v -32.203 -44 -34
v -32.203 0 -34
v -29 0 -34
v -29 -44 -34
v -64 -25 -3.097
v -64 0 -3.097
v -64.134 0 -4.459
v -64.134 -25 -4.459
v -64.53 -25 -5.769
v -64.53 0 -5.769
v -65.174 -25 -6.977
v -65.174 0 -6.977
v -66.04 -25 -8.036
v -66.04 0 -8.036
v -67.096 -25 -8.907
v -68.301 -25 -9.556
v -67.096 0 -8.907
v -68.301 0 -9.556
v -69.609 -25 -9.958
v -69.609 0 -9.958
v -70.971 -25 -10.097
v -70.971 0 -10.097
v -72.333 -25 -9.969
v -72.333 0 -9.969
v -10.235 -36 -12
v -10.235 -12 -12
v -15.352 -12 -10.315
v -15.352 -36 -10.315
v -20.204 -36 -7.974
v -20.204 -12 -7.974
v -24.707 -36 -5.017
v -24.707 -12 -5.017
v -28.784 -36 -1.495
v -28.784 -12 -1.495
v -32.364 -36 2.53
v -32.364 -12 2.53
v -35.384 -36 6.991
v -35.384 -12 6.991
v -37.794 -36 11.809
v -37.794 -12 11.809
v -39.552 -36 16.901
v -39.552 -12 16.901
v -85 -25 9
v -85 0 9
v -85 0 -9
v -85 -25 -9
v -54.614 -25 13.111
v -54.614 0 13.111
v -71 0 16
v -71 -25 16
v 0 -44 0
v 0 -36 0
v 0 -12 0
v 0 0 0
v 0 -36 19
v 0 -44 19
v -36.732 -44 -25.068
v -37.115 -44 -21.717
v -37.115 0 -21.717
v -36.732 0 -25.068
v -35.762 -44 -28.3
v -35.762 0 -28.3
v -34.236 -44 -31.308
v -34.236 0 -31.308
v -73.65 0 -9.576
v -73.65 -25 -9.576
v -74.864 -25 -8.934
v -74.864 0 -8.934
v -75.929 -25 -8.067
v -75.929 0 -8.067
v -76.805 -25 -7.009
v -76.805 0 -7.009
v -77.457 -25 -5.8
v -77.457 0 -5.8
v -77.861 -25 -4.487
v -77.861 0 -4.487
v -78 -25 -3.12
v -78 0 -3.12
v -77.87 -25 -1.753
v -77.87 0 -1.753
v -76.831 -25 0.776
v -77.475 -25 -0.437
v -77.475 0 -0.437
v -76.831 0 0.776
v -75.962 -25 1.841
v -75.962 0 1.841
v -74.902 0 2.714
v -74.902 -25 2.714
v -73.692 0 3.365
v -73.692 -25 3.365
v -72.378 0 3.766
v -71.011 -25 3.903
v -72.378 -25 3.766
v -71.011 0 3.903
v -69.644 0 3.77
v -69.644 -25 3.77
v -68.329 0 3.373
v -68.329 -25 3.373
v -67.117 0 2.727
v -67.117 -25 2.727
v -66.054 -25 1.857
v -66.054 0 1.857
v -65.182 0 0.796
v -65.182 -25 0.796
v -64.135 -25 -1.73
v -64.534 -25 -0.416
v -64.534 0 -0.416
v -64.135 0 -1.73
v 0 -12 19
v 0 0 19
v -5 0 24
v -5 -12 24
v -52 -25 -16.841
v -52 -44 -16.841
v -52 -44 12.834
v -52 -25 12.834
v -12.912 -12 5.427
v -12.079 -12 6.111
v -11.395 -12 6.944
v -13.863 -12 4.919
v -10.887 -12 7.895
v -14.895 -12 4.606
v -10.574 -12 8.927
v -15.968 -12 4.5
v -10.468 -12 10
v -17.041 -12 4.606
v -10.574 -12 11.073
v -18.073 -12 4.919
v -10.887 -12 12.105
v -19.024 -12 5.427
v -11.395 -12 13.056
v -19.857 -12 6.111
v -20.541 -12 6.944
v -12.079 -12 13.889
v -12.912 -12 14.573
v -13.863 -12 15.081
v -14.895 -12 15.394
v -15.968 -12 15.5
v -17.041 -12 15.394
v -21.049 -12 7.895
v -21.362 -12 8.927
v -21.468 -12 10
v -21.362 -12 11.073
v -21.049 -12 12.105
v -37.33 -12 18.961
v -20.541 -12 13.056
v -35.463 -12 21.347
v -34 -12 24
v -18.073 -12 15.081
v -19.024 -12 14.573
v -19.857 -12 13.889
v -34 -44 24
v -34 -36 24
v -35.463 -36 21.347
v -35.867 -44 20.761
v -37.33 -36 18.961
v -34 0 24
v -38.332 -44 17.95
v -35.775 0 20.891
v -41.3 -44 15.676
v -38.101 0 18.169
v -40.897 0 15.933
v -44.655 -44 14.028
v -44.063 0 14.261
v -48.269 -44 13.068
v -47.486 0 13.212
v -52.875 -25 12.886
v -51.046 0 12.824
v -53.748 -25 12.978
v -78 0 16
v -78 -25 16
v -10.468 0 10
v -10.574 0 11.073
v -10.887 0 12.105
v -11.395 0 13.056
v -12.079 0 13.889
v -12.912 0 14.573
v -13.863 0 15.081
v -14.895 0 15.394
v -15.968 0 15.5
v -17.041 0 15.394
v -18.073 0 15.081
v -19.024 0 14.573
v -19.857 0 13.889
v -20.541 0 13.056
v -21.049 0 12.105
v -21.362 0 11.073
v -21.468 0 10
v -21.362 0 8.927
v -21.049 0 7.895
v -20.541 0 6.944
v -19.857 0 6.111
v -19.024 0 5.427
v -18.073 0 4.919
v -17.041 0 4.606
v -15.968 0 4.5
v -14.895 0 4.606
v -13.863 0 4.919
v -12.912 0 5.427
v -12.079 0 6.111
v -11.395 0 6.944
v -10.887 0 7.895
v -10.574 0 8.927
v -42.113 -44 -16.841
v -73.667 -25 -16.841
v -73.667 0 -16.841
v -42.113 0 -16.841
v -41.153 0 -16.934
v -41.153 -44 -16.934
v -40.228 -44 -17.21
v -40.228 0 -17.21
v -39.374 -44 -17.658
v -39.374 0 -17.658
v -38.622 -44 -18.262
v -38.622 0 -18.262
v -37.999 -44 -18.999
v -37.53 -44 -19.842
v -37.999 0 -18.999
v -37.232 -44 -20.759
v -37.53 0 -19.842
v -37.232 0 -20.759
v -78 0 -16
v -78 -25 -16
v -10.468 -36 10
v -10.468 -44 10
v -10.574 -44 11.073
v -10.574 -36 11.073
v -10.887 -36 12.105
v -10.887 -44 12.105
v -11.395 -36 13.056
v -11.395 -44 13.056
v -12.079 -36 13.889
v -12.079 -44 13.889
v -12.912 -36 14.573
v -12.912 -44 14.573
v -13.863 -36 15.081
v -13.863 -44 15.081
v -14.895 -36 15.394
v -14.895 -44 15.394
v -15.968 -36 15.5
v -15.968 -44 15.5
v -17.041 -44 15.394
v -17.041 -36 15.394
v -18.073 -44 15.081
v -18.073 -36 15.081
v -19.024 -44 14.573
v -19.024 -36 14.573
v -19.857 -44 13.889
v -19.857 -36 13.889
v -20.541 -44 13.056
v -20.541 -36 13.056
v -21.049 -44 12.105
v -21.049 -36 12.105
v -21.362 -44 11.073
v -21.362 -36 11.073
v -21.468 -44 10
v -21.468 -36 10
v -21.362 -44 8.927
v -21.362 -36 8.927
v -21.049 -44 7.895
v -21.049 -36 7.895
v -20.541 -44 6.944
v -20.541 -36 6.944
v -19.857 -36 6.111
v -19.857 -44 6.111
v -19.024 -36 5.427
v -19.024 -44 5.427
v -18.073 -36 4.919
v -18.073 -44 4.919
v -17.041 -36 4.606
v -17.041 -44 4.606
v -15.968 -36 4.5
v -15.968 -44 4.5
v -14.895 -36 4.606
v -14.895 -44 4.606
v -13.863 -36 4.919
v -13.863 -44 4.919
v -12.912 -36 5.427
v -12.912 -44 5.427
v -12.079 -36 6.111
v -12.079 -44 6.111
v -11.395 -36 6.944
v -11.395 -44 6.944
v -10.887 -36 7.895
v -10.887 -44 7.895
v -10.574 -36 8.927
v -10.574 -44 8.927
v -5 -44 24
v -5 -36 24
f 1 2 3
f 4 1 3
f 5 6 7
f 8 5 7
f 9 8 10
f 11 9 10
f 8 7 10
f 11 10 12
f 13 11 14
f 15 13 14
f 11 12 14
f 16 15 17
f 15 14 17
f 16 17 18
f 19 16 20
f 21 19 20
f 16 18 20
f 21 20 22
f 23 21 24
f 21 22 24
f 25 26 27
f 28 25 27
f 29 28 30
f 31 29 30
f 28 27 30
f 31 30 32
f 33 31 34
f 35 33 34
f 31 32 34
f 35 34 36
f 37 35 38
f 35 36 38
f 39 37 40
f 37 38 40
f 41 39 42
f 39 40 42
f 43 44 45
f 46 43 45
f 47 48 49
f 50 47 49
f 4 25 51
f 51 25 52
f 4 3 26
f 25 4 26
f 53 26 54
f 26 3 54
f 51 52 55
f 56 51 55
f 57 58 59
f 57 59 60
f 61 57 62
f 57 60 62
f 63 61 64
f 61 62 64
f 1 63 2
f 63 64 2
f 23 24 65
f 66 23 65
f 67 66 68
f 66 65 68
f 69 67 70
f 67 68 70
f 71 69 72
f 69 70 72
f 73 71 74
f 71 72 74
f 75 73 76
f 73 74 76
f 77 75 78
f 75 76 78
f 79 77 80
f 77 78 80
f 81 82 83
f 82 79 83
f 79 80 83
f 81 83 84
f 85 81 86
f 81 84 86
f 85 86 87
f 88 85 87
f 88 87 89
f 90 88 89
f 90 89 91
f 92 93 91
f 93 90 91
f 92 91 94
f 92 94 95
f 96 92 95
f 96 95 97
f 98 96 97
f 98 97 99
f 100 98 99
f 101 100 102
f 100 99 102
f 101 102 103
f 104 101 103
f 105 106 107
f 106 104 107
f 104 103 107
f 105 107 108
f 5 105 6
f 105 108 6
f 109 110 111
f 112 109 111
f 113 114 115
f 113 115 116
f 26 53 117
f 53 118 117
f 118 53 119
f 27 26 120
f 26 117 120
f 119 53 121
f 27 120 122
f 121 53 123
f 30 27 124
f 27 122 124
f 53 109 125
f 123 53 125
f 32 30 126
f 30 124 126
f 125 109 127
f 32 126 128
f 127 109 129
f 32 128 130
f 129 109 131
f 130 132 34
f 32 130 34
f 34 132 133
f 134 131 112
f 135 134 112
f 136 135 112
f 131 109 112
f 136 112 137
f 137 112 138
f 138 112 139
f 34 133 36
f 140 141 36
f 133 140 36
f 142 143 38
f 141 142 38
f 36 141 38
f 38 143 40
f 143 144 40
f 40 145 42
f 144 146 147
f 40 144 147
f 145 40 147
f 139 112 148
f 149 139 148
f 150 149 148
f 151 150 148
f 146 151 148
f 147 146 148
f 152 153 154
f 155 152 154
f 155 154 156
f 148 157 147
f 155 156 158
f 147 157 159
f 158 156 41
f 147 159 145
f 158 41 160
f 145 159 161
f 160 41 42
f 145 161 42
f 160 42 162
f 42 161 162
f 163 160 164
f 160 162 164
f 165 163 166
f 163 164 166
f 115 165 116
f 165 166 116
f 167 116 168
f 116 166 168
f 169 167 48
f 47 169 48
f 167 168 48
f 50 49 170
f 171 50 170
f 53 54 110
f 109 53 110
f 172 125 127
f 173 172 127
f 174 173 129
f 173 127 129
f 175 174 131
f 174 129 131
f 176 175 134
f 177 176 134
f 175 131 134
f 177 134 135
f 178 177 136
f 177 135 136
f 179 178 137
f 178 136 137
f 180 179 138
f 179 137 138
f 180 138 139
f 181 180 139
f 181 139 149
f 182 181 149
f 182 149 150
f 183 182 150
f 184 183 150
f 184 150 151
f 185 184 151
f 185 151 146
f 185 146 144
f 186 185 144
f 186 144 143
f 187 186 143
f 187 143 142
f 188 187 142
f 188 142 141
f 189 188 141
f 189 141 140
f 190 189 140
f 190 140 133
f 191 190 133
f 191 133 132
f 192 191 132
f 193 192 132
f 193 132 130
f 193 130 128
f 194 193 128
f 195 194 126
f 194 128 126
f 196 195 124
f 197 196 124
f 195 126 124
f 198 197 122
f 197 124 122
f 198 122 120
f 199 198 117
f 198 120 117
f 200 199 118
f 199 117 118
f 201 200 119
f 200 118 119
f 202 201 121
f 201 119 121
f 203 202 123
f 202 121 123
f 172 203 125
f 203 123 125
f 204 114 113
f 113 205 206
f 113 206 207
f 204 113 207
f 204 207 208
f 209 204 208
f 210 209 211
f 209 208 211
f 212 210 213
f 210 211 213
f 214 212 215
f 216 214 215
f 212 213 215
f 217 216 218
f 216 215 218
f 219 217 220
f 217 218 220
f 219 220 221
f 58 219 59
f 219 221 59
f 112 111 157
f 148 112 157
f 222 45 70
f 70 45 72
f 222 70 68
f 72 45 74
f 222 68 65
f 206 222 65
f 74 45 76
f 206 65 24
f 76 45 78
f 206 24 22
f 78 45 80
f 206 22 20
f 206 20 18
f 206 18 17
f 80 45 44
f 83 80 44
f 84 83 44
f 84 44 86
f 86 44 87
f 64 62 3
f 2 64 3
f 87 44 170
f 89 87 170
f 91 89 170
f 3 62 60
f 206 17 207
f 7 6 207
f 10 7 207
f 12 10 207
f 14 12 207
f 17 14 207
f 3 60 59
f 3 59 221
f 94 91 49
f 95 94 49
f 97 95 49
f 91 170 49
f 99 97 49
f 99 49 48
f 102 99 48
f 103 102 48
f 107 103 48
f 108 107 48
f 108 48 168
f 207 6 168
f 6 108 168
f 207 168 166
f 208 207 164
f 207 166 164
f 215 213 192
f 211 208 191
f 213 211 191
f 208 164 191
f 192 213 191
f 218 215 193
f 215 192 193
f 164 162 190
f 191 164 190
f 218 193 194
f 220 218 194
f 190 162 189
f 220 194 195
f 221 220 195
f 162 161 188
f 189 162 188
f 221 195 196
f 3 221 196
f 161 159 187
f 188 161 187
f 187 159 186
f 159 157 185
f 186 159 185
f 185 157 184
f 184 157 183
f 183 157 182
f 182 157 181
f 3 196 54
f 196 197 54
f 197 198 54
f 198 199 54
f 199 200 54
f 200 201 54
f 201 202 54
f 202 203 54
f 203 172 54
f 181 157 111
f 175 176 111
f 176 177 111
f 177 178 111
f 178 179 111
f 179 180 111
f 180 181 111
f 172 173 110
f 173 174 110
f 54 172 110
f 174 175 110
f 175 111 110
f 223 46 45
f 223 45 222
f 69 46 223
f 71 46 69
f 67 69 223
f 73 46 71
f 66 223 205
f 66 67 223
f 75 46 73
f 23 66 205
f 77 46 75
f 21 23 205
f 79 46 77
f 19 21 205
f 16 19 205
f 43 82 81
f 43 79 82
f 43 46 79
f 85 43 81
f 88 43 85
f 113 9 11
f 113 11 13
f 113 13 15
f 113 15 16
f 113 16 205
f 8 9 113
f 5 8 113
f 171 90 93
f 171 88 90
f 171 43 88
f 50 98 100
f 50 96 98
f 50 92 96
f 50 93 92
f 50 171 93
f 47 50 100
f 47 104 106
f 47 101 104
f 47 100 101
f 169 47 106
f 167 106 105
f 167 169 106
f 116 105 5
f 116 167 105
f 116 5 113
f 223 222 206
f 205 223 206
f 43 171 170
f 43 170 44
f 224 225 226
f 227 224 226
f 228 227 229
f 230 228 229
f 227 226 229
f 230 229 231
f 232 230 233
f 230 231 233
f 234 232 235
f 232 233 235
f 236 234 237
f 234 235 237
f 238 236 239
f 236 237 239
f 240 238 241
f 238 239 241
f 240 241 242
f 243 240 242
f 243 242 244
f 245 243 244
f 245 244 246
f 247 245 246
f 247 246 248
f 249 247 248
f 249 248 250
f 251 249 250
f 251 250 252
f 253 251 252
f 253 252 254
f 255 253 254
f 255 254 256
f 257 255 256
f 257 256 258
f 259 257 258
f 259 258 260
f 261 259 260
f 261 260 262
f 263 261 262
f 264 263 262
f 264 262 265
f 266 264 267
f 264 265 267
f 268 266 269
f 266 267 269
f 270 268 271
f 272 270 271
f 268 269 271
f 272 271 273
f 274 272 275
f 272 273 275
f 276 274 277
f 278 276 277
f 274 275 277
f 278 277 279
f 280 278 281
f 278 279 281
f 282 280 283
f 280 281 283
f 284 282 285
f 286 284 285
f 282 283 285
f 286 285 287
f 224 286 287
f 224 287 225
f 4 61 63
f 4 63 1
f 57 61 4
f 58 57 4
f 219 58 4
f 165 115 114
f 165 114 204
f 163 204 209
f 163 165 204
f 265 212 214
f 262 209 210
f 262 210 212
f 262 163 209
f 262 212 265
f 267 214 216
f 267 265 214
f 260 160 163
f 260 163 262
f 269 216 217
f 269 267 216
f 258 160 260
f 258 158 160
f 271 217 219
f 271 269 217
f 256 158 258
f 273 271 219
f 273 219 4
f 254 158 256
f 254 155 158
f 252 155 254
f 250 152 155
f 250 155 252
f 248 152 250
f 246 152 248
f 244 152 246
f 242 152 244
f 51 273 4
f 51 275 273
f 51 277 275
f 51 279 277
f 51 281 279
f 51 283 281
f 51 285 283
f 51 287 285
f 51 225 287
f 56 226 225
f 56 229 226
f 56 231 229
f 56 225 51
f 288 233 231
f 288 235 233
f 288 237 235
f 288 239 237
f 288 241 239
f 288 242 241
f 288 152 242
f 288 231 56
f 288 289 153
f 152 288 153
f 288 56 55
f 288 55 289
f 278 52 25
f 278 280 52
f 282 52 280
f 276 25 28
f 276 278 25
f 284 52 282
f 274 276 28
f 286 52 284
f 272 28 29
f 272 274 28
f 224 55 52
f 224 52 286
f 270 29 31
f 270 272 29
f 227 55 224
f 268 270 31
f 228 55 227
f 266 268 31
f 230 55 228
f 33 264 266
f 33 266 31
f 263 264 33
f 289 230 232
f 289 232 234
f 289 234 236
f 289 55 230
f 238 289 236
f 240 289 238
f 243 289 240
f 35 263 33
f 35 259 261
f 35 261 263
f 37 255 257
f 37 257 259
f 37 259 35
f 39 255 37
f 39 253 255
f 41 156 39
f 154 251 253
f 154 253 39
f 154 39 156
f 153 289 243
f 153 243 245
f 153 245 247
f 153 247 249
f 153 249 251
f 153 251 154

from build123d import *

# Parameters (mm, degrees)
F1_DEPTH      = 44
F2_R          = 5.5
F3_DEPTH      = 44.001
F4_W          = 33
F4_H          = 19
F5_DEPTH      = 24.001
F5_DEPTH_BACK = 25
F8_DEPTH      = 24


with BuildPart() as f1:
    # F0 (on Front) → F1 (new body)
    with BuildSketch(Plane.XZ):
        with BuildLine():
            Line((-29, -34), (0, 0))
            Line((0, 0), (0, 19))
            Line((0, 19), (-5, 24))
            Line((-5, 24), (-34, 24))
            ThreePointArc((-34, 24), (-42.4407650408, 15.0219737764), (-54.6144594201, 13.1107871023))
            Line((-54.6144594201, 13.1107871023), (-71, 16))
            Line((-71, 16), (-78, 16))
            Line((-78, 16), (-85, 9))
            Line((-85, 9), (-85, 0))
            Line((-85, 0), (-85, -9))
            Line((-85, -9), (-78, -16))
            Line((-78, -16), (-73.6665455603, -16.8407740419))
            Line((-73.6665455603, -16.8407740419), (-42.1131182037, -16.8407740419))
            ThreePointArc((-42.1131182037, -16.8407740419), (-38.6217617691, -18.2616079035), (-37.1146603126, -21.7166019433))
            ThreePointArc((-37.1146603126, -21.7166019433), (-35.7621956578, -28.2996251104), (-32.2025494985, -34))
            Line((-32.2025494985, -34), (-29, -34))
        make_face()
        with BuildLine():
            ThreePointArc((-64, -3.0970651257), (-66.5465131336, -8.4976627528), (-72.3332727801, -9.9689195838))
            ThreePointArc((-72.3332727801, -9.9689195838), (-75.4534868664, 2.3035325015), (-64, -3.0970651257))
        make_face(mode=Mode.SUBTRACT)
    extrude(amount=F1_DEPTH)

    # F2 (on face) → F3 (cut, through all)
    with BuildSketch(Plane.XZ.offset(44)):
        with Locations((-15.9680212459, 10)):
            Circle(F2_R)
    extrude(amount=-F3_DEPTH, mode=Mode.SUBTRACT)

    # F4 (on Top) → F5 (cut, two sides)
    with BuildSketch(Plane.XY) as f5_sk:
        with Locations((-68.5, -34.5)):
            Rectangle(F4_W, F4_H)
    extrude(amount=F5_DEPTH, mode=Mode.SUBTRACT)
    extrude(f5_sk.sketch, amount=-F5_DEPTH_BACK, mode=Mode.SUBTRACT)

    # F7 (on offset) → F8 (cut)
    with BuildSketch(Plane(origin=(0, -12, 0), x_dir=(-1, 0, 0), z_dir=(0, 1, 0))):
        with BuildLine():
            Line((0, 0), (10.2352941176, -12))
            ThreePointArc((10.2352941176, -12), (28.7839327574, -1.495476016), (39.5518853442, 16.901486141))
            ThreePointArc((39.5518853442, 16.901486141), (36.348995532, 20.1168194328), (34, 24))
            Line((34, 24), (5, 24))
            Line((5, 24), (0, 19))
            Line((0, 19), (0, 0))
        make_face()
    extrude(amount=-F8_DEPTH, mode=Mode.SUBTRACT)


solid = f1.part
